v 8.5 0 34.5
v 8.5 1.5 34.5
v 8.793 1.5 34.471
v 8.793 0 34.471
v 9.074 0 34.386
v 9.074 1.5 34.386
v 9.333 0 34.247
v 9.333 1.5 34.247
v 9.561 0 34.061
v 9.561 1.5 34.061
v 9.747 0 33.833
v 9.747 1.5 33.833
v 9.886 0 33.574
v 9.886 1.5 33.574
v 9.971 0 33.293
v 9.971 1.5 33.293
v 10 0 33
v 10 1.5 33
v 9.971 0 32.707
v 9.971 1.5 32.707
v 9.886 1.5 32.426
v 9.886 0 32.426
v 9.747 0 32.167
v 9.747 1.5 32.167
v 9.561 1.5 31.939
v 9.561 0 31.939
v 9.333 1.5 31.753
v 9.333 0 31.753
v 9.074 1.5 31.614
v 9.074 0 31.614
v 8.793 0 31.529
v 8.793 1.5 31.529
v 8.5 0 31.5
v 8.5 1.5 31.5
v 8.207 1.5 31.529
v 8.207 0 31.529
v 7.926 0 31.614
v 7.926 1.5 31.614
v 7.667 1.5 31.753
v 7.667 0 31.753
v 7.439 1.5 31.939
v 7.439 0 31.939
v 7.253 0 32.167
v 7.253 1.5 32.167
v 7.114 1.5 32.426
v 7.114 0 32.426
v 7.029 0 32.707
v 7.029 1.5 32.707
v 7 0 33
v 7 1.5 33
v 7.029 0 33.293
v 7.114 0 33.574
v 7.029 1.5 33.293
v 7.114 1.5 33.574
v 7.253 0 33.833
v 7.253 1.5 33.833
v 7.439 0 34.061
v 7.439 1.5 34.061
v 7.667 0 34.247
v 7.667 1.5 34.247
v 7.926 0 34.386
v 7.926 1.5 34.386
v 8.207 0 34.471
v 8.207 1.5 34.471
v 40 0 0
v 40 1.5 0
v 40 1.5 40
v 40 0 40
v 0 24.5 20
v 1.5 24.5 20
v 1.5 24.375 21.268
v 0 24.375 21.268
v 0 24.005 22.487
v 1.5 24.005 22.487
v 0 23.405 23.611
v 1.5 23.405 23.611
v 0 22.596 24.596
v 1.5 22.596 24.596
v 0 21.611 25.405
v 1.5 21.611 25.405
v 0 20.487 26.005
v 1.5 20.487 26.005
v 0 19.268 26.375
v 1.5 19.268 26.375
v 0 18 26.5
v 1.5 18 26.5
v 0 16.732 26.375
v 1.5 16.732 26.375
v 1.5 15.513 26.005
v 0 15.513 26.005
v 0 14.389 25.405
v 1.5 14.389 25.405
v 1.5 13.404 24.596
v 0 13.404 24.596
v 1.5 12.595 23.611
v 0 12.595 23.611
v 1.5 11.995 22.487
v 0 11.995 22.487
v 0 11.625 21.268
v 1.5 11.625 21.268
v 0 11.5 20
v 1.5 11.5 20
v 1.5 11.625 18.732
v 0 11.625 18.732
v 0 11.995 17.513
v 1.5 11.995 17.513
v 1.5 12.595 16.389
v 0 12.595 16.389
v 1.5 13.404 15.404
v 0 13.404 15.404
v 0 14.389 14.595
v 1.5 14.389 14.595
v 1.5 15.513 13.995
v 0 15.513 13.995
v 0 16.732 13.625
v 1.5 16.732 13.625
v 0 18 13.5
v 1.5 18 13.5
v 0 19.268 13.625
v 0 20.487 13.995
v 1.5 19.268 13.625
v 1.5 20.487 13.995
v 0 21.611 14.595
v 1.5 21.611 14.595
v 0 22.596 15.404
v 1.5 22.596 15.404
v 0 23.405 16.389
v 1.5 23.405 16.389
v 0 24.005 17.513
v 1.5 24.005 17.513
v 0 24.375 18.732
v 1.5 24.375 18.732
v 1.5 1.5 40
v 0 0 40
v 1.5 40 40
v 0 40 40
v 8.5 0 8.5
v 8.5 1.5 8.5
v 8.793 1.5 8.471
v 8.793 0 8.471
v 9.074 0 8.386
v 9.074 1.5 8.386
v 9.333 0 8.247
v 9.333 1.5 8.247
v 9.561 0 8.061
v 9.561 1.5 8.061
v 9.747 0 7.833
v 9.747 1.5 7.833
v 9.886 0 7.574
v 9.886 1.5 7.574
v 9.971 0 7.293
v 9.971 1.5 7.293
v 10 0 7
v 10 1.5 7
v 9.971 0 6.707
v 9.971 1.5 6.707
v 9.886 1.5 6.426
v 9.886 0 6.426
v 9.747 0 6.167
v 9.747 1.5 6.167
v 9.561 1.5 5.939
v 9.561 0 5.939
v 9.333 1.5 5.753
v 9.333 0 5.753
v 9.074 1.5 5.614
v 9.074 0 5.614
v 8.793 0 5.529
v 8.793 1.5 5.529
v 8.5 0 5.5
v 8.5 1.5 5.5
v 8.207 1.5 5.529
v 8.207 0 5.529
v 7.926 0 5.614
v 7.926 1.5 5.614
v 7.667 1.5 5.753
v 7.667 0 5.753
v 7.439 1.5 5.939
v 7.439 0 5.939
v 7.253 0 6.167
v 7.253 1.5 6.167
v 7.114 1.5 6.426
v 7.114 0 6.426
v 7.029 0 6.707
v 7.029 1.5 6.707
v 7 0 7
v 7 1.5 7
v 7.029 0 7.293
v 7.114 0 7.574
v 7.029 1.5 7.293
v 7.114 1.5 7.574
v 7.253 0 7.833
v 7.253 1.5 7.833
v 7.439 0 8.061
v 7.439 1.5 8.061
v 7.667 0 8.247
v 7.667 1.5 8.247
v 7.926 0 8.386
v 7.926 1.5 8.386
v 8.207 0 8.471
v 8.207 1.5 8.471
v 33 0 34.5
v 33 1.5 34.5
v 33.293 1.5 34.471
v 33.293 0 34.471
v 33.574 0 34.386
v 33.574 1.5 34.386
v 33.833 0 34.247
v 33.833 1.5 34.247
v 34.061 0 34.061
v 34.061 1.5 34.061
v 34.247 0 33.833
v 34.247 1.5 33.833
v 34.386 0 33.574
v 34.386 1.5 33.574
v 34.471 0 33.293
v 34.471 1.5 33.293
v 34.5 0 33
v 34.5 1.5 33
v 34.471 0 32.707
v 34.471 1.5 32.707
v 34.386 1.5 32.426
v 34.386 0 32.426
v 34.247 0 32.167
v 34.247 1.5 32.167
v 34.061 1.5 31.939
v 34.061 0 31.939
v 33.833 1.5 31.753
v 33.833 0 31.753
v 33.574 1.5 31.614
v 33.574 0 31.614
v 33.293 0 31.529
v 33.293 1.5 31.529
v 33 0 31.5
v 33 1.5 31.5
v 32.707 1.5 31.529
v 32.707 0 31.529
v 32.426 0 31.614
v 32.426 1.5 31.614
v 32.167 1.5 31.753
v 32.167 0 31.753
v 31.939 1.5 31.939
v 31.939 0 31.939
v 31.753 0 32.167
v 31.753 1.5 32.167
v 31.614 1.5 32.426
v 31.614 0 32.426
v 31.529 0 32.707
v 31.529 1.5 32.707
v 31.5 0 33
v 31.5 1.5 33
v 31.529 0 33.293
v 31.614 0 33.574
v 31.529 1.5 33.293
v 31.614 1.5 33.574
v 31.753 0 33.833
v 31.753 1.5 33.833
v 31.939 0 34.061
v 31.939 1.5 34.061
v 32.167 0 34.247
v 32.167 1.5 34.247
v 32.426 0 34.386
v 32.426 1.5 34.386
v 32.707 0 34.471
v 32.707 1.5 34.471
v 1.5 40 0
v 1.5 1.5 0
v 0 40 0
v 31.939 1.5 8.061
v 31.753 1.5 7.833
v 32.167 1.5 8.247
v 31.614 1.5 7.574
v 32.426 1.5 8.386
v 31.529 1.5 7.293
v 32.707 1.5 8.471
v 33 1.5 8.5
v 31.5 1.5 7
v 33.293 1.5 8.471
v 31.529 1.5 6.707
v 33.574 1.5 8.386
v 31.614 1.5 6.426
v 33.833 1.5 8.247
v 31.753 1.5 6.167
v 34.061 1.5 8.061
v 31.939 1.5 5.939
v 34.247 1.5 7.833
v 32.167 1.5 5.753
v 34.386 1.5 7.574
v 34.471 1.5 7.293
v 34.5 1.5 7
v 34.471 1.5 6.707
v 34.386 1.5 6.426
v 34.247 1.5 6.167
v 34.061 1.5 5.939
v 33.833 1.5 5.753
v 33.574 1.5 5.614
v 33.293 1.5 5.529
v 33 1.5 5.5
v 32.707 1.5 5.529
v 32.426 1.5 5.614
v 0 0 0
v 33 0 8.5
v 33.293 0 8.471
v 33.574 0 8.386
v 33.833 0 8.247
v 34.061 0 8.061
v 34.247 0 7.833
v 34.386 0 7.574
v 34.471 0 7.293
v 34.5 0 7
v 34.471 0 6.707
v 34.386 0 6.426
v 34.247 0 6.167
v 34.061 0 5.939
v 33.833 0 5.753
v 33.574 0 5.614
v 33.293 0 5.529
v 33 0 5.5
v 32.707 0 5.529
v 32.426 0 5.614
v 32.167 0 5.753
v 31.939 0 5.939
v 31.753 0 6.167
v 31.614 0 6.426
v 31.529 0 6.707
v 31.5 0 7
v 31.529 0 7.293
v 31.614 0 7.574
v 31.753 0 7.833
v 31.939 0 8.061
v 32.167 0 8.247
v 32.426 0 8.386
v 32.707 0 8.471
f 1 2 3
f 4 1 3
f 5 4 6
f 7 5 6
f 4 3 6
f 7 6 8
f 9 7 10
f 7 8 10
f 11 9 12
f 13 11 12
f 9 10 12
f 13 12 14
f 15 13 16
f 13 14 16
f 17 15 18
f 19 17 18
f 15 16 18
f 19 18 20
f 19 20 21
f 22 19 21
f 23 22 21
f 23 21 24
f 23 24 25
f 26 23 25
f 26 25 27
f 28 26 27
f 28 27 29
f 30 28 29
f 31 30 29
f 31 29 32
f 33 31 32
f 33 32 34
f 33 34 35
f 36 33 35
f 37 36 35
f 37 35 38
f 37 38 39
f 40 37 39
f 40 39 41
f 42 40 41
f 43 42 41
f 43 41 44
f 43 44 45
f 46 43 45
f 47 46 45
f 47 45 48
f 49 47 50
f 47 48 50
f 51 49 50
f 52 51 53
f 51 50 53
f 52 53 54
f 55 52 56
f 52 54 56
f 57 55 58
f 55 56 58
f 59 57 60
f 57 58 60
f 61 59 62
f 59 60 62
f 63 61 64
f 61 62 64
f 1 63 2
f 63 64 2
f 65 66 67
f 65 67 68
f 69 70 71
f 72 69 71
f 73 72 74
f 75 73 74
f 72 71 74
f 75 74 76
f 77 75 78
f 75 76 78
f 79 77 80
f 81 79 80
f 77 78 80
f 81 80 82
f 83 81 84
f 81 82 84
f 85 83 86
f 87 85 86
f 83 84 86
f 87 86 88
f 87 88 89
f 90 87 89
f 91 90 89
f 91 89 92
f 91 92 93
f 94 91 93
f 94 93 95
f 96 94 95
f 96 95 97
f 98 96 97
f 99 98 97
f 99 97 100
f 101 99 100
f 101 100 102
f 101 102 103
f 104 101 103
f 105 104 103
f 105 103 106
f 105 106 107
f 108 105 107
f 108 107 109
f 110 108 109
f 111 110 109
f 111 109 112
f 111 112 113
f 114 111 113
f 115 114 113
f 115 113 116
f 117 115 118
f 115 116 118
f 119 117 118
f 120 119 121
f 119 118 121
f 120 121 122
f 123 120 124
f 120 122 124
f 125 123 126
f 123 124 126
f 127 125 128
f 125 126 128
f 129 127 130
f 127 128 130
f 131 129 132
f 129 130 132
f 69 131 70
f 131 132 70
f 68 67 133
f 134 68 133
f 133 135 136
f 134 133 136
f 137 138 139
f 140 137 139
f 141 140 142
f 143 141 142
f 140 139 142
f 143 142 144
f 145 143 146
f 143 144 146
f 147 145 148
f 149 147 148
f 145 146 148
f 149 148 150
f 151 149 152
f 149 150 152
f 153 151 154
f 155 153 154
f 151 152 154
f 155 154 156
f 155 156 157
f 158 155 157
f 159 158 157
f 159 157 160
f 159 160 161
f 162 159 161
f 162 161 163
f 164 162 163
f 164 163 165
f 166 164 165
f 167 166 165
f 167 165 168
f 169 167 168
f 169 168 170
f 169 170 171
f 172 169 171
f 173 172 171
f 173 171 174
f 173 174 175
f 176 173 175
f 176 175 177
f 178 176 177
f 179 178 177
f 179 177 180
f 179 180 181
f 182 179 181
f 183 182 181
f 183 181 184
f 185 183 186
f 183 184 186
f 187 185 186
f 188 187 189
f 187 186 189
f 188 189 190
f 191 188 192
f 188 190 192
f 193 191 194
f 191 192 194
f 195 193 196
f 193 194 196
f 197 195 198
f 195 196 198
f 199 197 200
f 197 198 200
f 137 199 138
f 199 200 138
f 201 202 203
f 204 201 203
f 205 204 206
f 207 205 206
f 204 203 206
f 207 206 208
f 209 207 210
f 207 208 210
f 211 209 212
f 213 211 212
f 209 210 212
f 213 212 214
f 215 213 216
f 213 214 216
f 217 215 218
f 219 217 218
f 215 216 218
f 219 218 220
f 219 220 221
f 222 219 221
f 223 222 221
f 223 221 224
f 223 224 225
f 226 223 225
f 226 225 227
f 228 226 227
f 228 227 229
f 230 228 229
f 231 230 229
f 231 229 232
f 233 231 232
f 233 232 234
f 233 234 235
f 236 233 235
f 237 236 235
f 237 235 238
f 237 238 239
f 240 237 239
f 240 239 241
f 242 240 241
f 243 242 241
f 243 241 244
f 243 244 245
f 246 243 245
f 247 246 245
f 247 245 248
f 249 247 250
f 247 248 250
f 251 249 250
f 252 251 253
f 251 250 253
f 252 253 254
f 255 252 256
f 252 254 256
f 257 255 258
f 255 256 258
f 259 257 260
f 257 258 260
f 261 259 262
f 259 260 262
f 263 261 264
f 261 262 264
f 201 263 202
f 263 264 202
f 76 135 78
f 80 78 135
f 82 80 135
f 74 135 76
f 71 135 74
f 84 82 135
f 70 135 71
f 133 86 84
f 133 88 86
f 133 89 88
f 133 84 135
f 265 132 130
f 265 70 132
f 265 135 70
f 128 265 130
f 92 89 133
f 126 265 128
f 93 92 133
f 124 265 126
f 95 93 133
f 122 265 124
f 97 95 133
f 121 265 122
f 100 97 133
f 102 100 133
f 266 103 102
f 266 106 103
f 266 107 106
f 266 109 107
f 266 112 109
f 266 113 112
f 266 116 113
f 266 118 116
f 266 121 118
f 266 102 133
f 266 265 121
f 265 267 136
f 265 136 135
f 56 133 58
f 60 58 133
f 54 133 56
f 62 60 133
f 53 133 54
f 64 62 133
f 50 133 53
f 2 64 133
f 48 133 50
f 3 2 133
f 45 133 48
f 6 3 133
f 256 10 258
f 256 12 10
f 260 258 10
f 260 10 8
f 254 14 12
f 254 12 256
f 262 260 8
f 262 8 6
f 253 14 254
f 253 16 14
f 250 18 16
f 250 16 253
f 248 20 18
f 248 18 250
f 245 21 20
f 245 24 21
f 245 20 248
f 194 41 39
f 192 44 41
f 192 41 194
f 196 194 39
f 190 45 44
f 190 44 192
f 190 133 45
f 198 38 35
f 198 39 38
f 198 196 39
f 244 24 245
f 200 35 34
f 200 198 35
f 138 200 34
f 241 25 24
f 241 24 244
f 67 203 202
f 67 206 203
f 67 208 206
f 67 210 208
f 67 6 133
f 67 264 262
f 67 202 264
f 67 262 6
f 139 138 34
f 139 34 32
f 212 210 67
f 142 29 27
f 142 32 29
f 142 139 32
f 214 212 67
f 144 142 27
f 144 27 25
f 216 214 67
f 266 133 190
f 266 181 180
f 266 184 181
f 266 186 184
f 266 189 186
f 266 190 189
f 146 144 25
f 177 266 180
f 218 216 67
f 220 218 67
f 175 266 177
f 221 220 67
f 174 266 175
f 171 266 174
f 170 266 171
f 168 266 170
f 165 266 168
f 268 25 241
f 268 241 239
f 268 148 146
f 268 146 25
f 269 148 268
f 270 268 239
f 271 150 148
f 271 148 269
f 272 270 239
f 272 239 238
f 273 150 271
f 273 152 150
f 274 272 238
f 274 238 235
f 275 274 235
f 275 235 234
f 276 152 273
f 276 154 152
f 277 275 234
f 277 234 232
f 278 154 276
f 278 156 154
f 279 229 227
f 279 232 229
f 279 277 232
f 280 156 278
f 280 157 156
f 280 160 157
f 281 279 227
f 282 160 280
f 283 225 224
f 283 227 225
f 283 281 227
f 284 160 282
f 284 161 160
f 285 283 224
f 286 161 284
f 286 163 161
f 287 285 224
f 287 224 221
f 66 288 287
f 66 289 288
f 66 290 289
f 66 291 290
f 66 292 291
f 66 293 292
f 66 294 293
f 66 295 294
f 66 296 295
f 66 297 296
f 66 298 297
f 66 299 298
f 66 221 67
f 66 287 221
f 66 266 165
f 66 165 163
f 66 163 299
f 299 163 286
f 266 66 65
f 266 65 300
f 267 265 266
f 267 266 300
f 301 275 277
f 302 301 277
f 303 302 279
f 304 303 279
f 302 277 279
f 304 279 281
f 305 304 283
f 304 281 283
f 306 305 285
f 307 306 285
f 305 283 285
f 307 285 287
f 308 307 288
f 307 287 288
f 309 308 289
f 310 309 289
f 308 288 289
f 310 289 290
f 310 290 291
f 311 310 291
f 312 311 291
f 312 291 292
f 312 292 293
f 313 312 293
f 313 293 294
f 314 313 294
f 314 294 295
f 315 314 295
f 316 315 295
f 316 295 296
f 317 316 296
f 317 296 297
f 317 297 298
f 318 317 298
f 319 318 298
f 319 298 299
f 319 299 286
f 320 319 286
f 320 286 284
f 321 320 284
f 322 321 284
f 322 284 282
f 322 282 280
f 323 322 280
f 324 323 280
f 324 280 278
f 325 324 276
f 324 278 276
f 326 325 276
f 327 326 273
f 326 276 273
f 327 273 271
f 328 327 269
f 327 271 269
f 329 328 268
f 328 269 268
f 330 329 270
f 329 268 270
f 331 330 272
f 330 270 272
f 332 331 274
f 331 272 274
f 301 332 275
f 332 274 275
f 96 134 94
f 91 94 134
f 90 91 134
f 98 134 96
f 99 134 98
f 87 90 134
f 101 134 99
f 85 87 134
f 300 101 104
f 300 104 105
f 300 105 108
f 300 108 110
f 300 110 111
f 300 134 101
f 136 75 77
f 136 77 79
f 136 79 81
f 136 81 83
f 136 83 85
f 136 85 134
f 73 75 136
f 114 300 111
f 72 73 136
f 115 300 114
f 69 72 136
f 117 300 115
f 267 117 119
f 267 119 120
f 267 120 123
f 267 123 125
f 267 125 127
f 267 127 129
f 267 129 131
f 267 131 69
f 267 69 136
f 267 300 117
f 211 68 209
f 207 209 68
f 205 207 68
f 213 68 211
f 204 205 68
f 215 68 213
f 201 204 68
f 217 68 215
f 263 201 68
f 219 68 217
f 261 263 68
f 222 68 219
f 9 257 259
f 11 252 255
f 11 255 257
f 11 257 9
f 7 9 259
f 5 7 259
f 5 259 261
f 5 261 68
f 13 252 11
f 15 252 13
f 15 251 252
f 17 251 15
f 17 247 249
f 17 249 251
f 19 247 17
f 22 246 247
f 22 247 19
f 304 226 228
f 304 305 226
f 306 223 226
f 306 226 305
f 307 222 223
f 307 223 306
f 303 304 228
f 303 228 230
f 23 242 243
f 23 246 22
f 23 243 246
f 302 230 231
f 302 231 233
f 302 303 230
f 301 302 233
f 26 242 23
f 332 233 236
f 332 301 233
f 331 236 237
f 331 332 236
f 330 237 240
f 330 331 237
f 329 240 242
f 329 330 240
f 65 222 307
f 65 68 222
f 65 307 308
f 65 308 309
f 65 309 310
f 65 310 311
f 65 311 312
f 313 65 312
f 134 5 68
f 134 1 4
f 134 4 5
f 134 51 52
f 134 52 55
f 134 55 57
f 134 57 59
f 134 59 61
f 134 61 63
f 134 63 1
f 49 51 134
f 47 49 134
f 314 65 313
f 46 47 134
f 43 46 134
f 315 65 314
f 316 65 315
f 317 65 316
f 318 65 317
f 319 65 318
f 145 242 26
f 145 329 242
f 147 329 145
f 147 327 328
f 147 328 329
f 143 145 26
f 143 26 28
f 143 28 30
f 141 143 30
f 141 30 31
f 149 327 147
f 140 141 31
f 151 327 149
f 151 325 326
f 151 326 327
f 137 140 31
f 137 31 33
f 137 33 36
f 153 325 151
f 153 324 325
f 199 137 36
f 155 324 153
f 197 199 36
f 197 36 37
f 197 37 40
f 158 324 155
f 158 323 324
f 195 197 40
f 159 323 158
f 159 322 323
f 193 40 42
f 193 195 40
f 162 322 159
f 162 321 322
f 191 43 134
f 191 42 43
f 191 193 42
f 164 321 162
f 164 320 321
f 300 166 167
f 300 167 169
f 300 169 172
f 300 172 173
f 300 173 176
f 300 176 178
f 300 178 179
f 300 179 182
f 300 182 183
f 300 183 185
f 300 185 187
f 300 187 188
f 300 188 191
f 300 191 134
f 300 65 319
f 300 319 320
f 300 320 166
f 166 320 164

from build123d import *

# Parameters (mm, degrees)
EXTRUSION1_DEPTH = 40
ESQUISSE2_R      = 6.5
EXTRUSION2_DEPTH = 30
ESQUISSE3_R      = 1.5
EXTRUSION3_DEPTH = 30


with BuildPart() as part:
    # Esquisse1 → Extrusion1 (new body)
    with BuildSketch(Plane.XY):
        Polygon((0, 0), (0, 40), (1.5, 40), (1.5, 1.5), (40, 1.5), (40, 0), align=None)
    extrude(amount=EXTRUSION1_DEPTH)

    # Esquisse2 → Extrusion2 (cut)
    with BuildSketch(Plane(origin=(1.5, 0, 0), x_dir=(0, 0, -1), z_dir=(1, 0, 0))):
        with Locations(Location((-20, 18, 0), (0, 0, 90))):
            Circle(ESQUISSE2_R)
    extrude(amount=-EXTRUSION2_DEPTH, mode=Mode.SUBTRACT)

    # Esquisse3 → Extrusion3 (cut)
    with BuildSketch(Plane(origin=(0, 1.5, 0), x_dir=(-1, 0, 0), z_dir=(0, 1, 0))):
        with Locations(Location((-8.5, 33, 0), (0, 0, 90))):
            Circle(ESQUISSE3_R)
        with Locations(Location((-8.5, 7, 0), (0, 0, 90))):
            Circle(ESQUISSE3_R)
        with Locations(Location((-33, 7, 0), (0, 0, 90))):
            Circle(ESQUISSE3_R)
        with Locations(Location((-33, 33, 0), (0, 0, 90))):
            Circle(ESQUISSE3_R)
    extrude(amount=-EXTRUSION3_DEPTH, mode=Mode.SUBTRACT)


solid = part.part
